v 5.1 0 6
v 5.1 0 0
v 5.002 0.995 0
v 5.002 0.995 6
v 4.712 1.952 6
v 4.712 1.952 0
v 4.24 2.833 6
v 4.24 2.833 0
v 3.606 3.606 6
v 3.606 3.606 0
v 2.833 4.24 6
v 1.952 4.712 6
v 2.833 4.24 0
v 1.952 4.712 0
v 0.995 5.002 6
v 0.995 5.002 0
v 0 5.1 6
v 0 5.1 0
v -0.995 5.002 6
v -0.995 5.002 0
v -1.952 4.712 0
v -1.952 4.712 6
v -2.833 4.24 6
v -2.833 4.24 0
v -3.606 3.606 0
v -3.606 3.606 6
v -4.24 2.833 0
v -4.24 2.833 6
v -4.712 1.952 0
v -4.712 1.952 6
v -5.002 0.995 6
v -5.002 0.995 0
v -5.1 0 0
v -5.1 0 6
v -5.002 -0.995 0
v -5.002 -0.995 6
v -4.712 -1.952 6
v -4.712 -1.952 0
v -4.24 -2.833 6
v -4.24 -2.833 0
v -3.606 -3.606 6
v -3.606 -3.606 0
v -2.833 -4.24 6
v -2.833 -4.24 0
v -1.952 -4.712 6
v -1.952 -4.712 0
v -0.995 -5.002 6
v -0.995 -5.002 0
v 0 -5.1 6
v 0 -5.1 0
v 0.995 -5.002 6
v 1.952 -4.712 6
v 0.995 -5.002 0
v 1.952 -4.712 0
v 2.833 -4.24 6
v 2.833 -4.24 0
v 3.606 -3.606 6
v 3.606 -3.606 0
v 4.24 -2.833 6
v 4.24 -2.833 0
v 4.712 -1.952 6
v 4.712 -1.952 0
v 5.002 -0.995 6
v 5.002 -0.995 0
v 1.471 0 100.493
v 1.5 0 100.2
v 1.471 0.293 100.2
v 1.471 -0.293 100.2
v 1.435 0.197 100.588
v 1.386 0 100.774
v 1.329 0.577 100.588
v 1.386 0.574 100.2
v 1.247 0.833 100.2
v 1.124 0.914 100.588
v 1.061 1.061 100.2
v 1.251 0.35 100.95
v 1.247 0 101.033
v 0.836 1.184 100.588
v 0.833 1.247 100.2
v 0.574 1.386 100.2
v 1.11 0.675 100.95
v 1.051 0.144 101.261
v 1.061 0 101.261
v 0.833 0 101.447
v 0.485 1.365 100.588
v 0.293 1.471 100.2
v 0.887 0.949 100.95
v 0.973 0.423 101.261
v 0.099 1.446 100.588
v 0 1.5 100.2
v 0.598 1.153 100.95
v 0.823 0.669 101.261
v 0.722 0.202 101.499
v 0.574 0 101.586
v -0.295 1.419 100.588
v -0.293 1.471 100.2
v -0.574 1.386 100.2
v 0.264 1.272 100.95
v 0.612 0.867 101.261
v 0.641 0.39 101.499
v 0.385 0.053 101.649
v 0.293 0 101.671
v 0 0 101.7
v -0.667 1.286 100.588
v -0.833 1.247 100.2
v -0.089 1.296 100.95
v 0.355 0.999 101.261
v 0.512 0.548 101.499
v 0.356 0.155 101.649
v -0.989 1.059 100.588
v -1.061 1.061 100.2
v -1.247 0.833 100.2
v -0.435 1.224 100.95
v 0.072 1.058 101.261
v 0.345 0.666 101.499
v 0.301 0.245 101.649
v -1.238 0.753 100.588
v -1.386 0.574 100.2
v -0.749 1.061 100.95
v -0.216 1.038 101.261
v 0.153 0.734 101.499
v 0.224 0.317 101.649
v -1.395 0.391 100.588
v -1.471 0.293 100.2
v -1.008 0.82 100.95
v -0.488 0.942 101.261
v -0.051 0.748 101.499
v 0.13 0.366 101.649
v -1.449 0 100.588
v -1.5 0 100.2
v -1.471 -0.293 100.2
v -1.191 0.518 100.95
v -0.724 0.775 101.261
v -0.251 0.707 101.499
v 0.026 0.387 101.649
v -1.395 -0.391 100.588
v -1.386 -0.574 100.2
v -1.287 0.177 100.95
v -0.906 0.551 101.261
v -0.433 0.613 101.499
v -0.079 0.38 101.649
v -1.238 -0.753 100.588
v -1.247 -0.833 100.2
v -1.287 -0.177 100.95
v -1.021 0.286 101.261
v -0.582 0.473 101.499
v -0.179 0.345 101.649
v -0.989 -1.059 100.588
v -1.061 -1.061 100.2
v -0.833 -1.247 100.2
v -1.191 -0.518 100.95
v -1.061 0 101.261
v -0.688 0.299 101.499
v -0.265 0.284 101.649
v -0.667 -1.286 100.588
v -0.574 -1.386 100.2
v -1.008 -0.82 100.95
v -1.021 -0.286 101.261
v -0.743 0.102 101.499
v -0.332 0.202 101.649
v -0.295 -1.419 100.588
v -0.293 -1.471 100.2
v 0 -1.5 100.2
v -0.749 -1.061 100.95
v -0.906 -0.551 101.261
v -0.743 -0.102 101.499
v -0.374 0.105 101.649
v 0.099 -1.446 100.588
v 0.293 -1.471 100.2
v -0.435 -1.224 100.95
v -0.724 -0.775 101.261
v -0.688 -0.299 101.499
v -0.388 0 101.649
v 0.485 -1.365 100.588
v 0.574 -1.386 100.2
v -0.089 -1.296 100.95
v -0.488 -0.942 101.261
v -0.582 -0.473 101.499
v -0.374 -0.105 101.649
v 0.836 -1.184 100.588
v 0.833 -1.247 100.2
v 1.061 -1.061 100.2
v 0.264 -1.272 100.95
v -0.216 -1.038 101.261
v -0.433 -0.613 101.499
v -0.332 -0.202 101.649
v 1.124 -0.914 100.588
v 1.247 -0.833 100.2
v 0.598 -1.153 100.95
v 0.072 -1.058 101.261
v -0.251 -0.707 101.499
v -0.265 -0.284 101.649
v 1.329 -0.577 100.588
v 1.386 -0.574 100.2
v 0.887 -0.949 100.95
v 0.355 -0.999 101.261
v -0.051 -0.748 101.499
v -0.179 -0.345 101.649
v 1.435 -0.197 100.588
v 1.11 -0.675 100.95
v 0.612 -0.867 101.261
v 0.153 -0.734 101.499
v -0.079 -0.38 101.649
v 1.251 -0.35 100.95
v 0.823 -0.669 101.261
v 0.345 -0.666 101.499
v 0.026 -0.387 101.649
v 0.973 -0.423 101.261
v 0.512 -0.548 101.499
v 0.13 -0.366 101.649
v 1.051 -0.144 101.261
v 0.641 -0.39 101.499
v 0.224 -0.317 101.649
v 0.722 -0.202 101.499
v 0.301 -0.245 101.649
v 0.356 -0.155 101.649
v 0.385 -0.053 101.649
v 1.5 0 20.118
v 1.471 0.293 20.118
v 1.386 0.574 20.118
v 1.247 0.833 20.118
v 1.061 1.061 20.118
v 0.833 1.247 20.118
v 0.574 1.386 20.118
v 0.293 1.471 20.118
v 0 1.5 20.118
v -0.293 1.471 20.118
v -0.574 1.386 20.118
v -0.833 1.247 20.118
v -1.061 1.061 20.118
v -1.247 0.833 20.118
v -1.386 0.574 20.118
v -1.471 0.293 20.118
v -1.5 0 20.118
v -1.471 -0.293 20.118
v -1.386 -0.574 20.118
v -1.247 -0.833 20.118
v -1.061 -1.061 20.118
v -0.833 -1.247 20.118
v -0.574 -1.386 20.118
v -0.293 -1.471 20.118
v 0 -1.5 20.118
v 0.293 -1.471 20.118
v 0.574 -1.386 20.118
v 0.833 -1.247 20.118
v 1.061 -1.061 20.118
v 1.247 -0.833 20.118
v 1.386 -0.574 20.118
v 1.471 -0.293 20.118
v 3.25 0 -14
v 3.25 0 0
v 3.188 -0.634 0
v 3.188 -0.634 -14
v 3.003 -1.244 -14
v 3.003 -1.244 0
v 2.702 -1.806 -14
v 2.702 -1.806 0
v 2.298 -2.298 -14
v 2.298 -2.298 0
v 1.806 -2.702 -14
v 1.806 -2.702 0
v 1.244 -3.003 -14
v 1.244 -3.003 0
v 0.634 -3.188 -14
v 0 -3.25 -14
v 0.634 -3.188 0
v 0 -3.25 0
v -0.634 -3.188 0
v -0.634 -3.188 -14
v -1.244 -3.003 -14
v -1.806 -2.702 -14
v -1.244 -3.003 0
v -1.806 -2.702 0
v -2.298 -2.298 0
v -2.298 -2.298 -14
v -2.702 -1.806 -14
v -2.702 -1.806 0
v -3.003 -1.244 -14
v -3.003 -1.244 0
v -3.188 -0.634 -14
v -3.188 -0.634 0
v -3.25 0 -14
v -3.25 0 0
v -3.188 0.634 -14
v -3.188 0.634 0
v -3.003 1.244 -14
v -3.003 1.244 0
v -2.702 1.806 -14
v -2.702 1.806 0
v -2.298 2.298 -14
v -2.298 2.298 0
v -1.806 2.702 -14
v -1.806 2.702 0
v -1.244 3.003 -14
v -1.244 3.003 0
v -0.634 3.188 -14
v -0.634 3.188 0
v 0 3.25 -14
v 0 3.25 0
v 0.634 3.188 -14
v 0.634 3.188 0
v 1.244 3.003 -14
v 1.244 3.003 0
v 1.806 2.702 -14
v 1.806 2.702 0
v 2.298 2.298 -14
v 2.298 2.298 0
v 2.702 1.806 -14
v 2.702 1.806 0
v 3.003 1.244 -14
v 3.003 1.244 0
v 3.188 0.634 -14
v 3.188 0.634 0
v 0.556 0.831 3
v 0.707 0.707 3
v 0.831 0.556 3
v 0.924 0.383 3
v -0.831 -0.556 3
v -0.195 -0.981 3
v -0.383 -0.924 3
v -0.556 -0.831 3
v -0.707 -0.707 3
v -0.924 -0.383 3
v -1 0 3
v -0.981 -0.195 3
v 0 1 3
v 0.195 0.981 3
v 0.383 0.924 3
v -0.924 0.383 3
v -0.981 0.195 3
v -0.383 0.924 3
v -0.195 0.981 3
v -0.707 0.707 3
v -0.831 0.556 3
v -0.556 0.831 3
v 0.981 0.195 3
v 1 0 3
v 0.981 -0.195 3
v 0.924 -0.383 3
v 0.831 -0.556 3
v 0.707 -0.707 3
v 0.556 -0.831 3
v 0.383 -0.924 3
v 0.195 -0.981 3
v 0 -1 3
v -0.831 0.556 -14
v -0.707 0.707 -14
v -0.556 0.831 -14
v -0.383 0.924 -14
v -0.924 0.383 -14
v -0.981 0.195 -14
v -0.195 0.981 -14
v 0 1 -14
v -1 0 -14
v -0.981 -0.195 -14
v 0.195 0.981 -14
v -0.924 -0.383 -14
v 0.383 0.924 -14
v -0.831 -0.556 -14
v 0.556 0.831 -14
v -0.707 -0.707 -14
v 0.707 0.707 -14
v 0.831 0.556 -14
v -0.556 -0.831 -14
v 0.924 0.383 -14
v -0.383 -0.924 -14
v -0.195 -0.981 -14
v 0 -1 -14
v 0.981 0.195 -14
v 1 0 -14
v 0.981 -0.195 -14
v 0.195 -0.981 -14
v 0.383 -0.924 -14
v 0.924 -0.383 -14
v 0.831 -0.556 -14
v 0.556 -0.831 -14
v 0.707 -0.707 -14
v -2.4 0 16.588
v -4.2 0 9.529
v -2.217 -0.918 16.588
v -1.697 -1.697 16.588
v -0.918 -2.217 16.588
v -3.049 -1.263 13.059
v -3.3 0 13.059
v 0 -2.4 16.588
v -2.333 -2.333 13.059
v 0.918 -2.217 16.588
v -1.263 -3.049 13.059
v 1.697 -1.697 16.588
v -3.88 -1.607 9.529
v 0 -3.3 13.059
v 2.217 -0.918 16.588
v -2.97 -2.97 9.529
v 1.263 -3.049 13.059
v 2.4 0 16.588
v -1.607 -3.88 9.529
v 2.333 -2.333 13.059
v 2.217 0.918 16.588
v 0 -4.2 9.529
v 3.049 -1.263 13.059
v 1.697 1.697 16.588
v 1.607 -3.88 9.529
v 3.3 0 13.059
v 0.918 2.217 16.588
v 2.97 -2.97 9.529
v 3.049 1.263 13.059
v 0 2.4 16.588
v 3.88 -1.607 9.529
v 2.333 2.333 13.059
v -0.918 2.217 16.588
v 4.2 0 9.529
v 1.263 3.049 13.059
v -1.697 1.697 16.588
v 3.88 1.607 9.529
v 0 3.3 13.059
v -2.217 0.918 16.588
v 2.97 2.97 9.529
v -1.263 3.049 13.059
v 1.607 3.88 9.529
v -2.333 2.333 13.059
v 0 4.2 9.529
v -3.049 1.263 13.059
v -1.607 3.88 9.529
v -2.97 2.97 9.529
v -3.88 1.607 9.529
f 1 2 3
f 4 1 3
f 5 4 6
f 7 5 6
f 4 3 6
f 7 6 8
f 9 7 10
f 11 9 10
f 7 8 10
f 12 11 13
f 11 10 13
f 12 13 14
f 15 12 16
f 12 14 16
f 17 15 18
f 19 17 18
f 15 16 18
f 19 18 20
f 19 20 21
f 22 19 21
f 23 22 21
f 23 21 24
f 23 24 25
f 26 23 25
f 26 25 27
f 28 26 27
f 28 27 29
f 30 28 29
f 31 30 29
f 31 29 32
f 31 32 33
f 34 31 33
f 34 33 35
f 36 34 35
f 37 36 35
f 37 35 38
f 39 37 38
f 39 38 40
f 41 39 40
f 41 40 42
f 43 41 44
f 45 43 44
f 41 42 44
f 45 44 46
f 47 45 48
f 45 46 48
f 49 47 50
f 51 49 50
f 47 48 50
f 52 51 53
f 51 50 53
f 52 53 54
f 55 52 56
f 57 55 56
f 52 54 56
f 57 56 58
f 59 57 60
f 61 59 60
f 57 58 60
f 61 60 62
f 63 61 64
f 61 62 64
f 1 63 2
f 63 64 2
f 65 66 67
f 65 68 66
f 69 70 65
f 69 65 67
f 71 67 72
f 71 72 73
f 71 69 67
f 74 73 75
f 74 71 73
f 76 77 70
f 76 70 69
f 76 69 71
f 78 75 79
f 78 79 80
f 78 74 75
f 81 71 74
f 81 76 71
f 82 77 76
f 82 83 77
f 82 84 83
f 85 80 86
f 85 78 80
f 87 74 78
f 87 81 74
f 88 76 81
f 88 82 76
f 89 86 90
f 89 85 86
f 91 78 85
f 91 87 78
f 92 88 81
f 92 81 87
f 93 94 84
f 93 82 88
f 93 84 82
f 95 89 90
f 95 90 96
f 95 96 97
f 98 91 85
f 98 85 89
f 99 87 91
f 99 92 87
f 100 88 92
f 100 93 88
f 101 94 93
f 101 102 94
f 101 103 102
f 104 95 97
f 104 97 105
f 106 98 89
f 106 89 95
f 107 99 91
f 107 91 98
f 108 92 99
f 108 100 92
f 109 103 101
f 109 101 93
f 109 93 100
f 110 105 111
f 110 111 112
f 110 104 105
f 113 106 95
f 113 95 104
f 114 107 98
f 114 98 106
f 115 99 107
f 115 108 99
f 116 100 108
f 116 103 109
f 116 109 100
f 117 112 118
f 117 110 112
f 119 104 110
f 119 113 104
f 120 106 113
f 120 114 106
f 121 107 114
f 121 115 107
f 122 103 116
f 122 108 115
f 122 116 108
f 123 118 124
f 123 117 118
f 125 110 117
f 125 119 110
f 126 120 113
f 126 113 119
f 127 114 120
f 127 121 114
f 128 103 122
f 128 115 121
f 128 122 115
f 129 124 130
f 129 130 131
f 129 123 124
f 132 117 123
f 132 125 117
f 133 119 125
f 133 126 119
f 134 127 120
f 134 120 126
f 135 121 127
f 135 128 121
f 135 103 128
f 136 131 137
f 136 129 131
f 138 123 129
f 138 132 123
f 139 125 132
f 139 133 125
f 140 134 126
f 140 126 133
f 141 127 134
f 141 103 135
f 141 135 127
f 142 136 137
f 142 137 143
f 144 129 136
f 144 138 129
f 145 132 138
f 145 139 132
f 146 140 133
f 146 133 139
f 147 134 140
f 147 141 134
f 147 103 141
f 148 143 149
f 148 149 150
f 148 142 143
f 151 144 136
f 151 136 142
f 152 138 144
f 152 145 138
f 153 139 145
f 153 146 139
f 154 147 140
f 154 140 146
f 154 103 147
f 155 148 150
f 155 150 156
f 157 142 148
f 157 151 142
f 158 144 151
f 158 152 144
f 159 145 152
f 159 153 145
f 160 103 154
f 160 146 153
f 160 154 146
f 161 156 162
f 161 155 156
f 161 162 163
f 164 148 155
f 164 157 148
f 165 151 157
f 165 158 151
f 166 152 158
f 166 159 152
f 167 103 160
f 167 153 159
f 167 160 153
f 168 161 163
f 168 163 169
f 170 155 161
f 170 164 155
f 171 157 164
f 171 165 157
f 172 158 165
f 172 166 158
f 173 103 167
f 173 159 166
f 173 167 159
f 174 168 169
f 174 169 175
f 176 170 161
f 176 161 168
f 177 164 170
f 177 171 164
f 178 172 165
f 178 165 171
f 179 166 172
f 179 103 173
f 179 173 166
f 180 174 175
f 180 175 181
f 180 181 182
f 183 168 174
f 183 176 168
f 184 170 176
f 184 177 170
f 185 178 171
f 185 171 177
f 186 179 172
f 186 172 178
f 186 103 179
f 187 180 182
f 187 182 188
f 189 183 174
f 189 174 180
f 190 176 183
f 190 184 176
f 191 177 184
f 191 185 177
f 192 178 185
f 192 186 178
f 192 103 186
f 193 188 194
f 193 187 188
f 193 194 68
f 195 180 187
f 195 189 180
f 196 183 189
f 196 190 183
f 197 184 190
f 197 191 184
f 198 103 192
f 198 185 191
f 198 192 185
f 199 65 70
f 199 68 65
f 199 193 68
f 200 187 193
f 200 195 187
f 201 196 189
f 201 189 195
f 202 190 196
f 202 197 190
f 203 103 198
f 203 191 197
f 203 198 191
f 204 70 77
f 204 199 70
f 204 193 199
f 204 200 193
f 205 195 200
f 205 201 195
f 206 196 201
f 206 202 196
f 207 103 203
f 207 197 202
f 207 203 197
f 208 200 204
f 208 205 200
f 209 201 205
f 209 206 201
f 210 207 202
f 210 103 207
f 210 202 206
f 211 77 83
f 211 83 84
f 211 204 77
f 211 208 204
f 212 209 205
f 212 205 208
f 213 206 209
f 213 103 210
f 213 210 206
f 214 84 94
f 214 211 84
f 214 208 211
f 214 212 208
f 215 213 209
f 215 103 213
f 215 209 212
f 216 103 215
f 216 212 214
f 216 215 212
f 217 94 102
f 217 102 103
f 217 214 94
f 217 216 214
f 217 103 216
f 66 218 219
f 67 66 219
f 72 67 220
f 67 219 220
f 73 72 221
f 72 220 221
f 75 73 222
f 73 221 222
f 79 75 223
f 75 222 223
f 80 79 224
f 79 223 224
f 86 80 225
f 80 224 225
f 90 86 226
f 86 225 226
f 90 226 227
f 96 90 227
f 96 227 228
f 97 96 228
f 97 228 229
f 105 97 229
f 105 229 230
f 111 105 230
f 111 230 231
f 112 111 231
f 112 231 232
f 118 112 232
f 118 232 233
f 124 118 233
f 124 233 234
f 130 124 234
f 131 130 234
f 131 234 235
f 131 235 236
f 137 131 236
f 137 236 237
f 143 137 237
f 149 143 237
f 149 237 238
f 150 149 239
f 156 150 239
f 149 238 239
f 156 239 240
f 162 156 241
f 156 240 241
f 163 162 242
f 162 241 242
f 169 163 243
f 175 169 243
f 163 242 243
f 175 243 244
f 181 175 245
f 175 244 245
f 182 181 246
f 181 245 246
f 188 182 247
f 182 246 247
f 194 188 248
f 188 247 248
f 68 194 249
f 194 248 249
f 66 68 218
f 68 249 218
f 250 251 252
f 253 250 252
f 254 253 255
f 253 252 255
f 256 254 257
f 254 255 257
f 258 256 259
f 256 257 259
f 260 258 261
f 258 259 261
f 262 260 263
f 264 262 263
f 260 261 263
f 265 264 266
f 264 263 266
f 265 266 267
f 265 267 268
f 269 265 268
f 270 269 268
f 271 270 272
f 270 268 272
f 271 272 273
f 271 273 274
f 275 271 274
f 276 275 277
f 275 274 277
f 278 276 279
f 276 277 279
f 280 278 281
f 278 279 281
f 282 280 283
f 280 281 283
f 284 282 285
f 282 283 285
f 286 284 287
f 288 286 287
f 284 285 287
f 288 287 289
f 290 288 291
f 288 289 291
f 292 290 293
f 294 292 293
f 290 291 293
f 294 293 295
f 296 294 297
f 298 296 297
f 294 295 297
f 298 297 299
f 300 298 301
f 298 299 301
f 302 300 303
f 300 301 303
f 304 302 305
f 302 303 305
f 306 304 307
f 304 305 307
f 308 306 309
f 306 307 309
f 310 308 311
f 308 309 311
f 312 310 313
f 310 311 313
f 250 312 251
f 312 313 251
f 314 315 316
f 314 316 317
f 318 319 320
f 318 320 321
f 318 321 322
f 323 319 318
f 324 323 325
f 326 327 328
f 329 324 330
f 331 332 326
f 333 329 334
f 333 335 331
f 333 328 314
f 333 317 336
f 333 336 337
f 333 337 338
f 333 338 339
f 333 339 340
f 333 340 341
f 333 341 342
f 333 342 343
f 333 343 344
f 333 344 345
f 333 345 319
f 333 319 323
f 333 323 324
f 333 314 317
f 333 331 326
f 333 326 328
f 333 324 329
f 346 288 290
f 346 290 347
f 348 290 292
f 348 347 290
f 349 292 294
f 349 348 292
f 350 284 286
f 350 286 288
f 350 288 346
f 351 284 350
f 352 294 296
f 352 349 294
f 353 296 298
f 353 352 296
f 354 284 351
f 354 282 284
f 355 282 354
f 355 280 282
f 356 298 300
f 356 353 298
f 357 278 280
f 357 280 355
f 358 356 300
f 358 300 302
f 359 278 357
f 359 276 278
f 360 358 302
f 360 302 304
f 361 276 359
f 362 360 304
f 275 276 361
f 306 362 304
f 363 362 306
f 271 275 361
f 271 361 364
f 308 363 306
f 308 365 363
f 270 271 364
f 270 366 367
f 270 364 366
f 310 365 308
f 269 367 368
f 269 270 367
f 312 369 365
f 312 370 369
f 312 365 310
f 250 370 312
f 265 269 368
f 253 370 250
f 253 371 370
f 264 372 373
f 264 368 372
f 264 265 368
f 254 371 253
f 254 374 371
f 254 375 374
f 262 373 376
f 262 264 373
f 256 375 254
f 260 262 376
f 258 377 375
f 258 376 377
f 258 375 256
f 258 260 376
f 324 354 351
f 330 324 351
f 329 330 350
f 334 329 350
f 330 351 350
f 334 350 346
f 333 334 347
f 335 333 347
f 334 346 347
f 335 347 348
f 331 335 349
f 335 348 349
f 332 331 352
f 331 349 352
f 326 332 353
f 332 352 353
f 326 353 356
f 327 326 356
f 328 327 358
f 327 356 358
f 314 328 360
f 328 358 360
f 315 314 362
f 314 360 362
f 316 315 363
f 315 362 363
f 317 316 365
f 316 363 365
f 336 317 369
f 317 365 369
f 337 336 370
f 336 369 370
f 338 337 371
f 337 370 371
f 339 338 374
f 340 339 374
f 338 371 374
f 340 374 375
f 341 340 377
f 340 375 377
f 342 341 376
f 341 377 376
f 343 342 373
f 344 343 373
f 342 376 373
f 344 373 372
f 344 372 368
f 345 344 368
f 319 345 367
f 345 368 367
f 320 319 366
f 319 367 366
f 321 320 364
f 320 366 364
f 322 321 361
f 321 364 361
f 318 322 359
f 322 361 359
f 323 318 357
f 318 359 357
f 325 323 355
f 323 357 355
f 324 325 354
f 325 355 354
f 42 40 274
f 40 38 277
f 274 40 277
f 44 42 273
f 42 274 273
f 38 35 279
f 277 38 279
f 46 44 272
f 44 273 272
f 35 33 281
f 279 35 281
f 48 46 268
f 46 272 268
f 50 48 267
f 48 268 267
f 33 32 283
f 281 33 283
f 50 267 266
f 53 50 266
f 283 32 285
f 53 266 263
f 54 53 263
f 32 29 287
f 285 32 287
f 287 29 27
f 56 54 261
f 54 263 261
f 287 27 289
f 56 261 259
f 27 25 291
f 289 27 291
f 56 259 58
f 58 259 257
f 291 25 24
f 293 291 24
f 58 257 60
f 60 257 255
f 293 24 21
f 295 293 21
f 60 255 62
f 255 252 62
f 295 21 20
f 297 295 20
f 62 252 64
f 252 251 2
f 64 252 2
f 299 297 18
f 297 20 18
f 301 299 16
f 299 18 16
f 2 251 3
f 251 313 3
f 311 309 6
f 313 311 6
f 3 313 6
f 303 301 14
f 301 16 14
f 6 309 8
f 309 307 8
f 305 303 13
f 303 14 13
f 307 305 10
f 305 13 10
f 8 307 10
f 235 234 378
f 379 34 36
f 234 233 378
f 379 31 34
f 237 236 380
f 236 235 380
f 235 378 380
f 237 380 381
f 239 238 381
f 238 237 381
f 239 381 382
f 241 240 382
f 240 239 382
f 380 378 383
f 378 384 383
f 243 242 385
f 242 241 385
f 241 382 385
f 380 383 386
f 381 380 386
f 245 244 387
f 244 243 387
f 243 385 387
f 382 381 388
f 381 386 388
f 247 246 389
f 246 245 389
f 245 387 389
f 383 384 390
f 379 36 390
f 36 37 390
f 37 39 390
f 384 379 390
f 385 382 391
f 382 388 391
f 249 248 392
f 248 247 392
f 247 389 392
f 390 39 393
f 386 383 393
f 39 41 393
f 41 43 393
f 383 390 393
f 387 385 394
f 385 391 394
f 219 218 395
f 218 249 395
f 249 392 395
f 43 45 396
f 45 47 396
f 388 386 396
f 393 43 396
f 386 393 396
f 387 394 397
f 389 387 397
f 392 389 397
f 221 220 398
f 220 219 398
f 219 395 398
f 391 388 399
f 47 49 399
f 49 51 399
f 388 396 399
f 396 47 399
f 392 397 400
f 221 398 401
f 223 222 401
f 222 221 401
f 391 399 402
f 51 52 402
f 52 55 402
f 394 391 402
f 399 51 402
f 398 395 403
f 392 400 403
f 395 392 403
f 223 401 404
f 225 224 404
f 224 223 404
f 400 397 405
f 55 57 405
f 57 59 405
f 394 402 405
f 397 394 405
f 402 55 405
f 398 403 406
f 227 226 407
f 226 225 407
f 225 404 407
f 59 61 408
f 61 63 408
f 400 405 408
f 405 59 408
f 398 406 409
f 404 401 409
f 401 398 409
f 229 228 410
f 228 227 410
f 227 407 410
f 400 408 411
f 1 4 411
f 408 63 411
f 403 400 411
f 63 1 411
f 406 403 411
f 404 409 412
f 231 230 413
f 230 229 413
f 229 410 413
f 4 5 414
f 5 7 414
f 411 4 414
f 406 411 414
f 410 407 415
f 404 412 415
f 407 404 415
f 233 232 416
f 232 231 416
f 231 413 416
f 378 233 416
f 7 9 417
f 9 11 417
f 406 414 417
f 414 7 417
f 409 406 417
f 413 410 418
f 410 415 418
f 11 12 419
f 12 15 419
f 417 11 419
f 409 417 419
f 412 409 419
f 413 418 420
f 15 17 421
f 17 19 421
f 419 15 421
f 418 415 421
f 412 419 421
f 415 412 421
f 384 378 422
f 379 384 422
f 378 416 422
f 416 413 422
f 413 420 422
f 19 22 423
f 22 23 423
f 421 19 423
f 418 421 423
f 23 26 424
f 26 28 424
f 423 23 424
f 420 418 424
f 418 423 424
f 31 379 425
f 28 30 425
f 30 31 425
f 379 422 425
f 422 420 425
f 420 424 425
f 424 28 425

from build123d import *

# Parameters (mm, degrees)
ESQUISSE1_R             = 8.5
BOSS_EXTRU_1_DEPTH      = 10
ESQUISSE2_R             = 2.5
BOSS_EXTRU_2_DEPTH      = 157
ECHELLE2_SCALE          = 0.6
ESQUISSE5_R             = 3.25
BOSS_EXTRU_4_DEPTH      = 14
ESQUISSE6_R             = 1
ENL_V_MAT_EXTRU_1_DEPTH = 17
D_ME1_FACE_RADIUS       = 1.5
D_ME1_HEIGHT            = 1.5


with BuildPart() as part:
    # Esquisse1 → Boss.-Extru.1 (new body)
    with BuildSketch(Plane.XY):
        Circle(ESQUISSE1_R)
    extrude(amount=BOSS_EXTRU_1_DEPTH)

    # Esquisse2 → Boss.-Extru.2 (add)
    with BuildSketch(Plane.XY.offset(10)):
        Circle(ESQUISSE2_R)
    extrude(amount=BOSS_EXTRU_2_DEPTH)


with BuildPart() as part_1:
    # Echelle2: scaled about (0, 0, 0)
    add(part.part.scale(ECHELLE2_SCALE))

    # Esquisse5 → Boss.-Extru.4 (add)
    with BuildSketch(Plane(origin=(0, 0, 0), x_dir=(-1, 0, 0), z_dir=(0, 0, -1))):
        with Locations(Location((0, 0, 0), (0, 0, 180))):
            Circle(ESQUISSE5_R)
    extrude(amount=BOSS_EXTRU_4_DEPTH)

    # Esquisse6 → Enlèv. mat.-Extru.1 (cut)
    with BuildSketch(Plane(origin=(0, 0, -14), x_dir=(-1, 0, 0), z_dir=(0, 0, -1))):
        Circle(ESQUISSE6_R)
    extrude(amount=-ENL_V_MAT_EXTRU_1_DEPTH, mode=Mode.SUBTRACT)

    # Esquisse8 → Révolution1 (revolve)
    with BuildSketch(Plane(origin=(0, 0, 0), x_dir=(1, 0, 0), z_dir=(0, 1, 0)), mode=Mode.PRIVATE) as r_volution1_sk:
        Polygon((5.1, -6), (0, -6), (0, -26), align=None)
    revolve(r_volution1_sk.sketch.rotate(Axis((0, 0, 6), (0, 0, 1)), 180), axis=Axis((0, 0, 6), (0, 0, 1)))

    # Dôme1: a dome of height H over a round flat face of radius A is a cap of a sphere of radius (A * A + H * H) / (2 * H)
    d_me1_r = (D_ME1_FACE_RADIUS * D_ME1_FACE_RADIUS + D_ME1_HEIGHT * D_ME1_HEIGHT) / (2 * D_ME1_HEIGHT)
    d_me1_base = Plane((0, 0, 100.2), z_dir=(0, 0, 1))
    with Locations(d_me1_base.offset(D_ME1_HEIGHT - d_me1_r)):
        d_me1_ball = Sphere(d_me1_r, mode=Mode.PRIVATE)
    add(split(d_me1_ball, bisect_by=d_me1_base, keep=Keep.TOP, mode=Mode.PRIVATE))


solid = part_1.part
